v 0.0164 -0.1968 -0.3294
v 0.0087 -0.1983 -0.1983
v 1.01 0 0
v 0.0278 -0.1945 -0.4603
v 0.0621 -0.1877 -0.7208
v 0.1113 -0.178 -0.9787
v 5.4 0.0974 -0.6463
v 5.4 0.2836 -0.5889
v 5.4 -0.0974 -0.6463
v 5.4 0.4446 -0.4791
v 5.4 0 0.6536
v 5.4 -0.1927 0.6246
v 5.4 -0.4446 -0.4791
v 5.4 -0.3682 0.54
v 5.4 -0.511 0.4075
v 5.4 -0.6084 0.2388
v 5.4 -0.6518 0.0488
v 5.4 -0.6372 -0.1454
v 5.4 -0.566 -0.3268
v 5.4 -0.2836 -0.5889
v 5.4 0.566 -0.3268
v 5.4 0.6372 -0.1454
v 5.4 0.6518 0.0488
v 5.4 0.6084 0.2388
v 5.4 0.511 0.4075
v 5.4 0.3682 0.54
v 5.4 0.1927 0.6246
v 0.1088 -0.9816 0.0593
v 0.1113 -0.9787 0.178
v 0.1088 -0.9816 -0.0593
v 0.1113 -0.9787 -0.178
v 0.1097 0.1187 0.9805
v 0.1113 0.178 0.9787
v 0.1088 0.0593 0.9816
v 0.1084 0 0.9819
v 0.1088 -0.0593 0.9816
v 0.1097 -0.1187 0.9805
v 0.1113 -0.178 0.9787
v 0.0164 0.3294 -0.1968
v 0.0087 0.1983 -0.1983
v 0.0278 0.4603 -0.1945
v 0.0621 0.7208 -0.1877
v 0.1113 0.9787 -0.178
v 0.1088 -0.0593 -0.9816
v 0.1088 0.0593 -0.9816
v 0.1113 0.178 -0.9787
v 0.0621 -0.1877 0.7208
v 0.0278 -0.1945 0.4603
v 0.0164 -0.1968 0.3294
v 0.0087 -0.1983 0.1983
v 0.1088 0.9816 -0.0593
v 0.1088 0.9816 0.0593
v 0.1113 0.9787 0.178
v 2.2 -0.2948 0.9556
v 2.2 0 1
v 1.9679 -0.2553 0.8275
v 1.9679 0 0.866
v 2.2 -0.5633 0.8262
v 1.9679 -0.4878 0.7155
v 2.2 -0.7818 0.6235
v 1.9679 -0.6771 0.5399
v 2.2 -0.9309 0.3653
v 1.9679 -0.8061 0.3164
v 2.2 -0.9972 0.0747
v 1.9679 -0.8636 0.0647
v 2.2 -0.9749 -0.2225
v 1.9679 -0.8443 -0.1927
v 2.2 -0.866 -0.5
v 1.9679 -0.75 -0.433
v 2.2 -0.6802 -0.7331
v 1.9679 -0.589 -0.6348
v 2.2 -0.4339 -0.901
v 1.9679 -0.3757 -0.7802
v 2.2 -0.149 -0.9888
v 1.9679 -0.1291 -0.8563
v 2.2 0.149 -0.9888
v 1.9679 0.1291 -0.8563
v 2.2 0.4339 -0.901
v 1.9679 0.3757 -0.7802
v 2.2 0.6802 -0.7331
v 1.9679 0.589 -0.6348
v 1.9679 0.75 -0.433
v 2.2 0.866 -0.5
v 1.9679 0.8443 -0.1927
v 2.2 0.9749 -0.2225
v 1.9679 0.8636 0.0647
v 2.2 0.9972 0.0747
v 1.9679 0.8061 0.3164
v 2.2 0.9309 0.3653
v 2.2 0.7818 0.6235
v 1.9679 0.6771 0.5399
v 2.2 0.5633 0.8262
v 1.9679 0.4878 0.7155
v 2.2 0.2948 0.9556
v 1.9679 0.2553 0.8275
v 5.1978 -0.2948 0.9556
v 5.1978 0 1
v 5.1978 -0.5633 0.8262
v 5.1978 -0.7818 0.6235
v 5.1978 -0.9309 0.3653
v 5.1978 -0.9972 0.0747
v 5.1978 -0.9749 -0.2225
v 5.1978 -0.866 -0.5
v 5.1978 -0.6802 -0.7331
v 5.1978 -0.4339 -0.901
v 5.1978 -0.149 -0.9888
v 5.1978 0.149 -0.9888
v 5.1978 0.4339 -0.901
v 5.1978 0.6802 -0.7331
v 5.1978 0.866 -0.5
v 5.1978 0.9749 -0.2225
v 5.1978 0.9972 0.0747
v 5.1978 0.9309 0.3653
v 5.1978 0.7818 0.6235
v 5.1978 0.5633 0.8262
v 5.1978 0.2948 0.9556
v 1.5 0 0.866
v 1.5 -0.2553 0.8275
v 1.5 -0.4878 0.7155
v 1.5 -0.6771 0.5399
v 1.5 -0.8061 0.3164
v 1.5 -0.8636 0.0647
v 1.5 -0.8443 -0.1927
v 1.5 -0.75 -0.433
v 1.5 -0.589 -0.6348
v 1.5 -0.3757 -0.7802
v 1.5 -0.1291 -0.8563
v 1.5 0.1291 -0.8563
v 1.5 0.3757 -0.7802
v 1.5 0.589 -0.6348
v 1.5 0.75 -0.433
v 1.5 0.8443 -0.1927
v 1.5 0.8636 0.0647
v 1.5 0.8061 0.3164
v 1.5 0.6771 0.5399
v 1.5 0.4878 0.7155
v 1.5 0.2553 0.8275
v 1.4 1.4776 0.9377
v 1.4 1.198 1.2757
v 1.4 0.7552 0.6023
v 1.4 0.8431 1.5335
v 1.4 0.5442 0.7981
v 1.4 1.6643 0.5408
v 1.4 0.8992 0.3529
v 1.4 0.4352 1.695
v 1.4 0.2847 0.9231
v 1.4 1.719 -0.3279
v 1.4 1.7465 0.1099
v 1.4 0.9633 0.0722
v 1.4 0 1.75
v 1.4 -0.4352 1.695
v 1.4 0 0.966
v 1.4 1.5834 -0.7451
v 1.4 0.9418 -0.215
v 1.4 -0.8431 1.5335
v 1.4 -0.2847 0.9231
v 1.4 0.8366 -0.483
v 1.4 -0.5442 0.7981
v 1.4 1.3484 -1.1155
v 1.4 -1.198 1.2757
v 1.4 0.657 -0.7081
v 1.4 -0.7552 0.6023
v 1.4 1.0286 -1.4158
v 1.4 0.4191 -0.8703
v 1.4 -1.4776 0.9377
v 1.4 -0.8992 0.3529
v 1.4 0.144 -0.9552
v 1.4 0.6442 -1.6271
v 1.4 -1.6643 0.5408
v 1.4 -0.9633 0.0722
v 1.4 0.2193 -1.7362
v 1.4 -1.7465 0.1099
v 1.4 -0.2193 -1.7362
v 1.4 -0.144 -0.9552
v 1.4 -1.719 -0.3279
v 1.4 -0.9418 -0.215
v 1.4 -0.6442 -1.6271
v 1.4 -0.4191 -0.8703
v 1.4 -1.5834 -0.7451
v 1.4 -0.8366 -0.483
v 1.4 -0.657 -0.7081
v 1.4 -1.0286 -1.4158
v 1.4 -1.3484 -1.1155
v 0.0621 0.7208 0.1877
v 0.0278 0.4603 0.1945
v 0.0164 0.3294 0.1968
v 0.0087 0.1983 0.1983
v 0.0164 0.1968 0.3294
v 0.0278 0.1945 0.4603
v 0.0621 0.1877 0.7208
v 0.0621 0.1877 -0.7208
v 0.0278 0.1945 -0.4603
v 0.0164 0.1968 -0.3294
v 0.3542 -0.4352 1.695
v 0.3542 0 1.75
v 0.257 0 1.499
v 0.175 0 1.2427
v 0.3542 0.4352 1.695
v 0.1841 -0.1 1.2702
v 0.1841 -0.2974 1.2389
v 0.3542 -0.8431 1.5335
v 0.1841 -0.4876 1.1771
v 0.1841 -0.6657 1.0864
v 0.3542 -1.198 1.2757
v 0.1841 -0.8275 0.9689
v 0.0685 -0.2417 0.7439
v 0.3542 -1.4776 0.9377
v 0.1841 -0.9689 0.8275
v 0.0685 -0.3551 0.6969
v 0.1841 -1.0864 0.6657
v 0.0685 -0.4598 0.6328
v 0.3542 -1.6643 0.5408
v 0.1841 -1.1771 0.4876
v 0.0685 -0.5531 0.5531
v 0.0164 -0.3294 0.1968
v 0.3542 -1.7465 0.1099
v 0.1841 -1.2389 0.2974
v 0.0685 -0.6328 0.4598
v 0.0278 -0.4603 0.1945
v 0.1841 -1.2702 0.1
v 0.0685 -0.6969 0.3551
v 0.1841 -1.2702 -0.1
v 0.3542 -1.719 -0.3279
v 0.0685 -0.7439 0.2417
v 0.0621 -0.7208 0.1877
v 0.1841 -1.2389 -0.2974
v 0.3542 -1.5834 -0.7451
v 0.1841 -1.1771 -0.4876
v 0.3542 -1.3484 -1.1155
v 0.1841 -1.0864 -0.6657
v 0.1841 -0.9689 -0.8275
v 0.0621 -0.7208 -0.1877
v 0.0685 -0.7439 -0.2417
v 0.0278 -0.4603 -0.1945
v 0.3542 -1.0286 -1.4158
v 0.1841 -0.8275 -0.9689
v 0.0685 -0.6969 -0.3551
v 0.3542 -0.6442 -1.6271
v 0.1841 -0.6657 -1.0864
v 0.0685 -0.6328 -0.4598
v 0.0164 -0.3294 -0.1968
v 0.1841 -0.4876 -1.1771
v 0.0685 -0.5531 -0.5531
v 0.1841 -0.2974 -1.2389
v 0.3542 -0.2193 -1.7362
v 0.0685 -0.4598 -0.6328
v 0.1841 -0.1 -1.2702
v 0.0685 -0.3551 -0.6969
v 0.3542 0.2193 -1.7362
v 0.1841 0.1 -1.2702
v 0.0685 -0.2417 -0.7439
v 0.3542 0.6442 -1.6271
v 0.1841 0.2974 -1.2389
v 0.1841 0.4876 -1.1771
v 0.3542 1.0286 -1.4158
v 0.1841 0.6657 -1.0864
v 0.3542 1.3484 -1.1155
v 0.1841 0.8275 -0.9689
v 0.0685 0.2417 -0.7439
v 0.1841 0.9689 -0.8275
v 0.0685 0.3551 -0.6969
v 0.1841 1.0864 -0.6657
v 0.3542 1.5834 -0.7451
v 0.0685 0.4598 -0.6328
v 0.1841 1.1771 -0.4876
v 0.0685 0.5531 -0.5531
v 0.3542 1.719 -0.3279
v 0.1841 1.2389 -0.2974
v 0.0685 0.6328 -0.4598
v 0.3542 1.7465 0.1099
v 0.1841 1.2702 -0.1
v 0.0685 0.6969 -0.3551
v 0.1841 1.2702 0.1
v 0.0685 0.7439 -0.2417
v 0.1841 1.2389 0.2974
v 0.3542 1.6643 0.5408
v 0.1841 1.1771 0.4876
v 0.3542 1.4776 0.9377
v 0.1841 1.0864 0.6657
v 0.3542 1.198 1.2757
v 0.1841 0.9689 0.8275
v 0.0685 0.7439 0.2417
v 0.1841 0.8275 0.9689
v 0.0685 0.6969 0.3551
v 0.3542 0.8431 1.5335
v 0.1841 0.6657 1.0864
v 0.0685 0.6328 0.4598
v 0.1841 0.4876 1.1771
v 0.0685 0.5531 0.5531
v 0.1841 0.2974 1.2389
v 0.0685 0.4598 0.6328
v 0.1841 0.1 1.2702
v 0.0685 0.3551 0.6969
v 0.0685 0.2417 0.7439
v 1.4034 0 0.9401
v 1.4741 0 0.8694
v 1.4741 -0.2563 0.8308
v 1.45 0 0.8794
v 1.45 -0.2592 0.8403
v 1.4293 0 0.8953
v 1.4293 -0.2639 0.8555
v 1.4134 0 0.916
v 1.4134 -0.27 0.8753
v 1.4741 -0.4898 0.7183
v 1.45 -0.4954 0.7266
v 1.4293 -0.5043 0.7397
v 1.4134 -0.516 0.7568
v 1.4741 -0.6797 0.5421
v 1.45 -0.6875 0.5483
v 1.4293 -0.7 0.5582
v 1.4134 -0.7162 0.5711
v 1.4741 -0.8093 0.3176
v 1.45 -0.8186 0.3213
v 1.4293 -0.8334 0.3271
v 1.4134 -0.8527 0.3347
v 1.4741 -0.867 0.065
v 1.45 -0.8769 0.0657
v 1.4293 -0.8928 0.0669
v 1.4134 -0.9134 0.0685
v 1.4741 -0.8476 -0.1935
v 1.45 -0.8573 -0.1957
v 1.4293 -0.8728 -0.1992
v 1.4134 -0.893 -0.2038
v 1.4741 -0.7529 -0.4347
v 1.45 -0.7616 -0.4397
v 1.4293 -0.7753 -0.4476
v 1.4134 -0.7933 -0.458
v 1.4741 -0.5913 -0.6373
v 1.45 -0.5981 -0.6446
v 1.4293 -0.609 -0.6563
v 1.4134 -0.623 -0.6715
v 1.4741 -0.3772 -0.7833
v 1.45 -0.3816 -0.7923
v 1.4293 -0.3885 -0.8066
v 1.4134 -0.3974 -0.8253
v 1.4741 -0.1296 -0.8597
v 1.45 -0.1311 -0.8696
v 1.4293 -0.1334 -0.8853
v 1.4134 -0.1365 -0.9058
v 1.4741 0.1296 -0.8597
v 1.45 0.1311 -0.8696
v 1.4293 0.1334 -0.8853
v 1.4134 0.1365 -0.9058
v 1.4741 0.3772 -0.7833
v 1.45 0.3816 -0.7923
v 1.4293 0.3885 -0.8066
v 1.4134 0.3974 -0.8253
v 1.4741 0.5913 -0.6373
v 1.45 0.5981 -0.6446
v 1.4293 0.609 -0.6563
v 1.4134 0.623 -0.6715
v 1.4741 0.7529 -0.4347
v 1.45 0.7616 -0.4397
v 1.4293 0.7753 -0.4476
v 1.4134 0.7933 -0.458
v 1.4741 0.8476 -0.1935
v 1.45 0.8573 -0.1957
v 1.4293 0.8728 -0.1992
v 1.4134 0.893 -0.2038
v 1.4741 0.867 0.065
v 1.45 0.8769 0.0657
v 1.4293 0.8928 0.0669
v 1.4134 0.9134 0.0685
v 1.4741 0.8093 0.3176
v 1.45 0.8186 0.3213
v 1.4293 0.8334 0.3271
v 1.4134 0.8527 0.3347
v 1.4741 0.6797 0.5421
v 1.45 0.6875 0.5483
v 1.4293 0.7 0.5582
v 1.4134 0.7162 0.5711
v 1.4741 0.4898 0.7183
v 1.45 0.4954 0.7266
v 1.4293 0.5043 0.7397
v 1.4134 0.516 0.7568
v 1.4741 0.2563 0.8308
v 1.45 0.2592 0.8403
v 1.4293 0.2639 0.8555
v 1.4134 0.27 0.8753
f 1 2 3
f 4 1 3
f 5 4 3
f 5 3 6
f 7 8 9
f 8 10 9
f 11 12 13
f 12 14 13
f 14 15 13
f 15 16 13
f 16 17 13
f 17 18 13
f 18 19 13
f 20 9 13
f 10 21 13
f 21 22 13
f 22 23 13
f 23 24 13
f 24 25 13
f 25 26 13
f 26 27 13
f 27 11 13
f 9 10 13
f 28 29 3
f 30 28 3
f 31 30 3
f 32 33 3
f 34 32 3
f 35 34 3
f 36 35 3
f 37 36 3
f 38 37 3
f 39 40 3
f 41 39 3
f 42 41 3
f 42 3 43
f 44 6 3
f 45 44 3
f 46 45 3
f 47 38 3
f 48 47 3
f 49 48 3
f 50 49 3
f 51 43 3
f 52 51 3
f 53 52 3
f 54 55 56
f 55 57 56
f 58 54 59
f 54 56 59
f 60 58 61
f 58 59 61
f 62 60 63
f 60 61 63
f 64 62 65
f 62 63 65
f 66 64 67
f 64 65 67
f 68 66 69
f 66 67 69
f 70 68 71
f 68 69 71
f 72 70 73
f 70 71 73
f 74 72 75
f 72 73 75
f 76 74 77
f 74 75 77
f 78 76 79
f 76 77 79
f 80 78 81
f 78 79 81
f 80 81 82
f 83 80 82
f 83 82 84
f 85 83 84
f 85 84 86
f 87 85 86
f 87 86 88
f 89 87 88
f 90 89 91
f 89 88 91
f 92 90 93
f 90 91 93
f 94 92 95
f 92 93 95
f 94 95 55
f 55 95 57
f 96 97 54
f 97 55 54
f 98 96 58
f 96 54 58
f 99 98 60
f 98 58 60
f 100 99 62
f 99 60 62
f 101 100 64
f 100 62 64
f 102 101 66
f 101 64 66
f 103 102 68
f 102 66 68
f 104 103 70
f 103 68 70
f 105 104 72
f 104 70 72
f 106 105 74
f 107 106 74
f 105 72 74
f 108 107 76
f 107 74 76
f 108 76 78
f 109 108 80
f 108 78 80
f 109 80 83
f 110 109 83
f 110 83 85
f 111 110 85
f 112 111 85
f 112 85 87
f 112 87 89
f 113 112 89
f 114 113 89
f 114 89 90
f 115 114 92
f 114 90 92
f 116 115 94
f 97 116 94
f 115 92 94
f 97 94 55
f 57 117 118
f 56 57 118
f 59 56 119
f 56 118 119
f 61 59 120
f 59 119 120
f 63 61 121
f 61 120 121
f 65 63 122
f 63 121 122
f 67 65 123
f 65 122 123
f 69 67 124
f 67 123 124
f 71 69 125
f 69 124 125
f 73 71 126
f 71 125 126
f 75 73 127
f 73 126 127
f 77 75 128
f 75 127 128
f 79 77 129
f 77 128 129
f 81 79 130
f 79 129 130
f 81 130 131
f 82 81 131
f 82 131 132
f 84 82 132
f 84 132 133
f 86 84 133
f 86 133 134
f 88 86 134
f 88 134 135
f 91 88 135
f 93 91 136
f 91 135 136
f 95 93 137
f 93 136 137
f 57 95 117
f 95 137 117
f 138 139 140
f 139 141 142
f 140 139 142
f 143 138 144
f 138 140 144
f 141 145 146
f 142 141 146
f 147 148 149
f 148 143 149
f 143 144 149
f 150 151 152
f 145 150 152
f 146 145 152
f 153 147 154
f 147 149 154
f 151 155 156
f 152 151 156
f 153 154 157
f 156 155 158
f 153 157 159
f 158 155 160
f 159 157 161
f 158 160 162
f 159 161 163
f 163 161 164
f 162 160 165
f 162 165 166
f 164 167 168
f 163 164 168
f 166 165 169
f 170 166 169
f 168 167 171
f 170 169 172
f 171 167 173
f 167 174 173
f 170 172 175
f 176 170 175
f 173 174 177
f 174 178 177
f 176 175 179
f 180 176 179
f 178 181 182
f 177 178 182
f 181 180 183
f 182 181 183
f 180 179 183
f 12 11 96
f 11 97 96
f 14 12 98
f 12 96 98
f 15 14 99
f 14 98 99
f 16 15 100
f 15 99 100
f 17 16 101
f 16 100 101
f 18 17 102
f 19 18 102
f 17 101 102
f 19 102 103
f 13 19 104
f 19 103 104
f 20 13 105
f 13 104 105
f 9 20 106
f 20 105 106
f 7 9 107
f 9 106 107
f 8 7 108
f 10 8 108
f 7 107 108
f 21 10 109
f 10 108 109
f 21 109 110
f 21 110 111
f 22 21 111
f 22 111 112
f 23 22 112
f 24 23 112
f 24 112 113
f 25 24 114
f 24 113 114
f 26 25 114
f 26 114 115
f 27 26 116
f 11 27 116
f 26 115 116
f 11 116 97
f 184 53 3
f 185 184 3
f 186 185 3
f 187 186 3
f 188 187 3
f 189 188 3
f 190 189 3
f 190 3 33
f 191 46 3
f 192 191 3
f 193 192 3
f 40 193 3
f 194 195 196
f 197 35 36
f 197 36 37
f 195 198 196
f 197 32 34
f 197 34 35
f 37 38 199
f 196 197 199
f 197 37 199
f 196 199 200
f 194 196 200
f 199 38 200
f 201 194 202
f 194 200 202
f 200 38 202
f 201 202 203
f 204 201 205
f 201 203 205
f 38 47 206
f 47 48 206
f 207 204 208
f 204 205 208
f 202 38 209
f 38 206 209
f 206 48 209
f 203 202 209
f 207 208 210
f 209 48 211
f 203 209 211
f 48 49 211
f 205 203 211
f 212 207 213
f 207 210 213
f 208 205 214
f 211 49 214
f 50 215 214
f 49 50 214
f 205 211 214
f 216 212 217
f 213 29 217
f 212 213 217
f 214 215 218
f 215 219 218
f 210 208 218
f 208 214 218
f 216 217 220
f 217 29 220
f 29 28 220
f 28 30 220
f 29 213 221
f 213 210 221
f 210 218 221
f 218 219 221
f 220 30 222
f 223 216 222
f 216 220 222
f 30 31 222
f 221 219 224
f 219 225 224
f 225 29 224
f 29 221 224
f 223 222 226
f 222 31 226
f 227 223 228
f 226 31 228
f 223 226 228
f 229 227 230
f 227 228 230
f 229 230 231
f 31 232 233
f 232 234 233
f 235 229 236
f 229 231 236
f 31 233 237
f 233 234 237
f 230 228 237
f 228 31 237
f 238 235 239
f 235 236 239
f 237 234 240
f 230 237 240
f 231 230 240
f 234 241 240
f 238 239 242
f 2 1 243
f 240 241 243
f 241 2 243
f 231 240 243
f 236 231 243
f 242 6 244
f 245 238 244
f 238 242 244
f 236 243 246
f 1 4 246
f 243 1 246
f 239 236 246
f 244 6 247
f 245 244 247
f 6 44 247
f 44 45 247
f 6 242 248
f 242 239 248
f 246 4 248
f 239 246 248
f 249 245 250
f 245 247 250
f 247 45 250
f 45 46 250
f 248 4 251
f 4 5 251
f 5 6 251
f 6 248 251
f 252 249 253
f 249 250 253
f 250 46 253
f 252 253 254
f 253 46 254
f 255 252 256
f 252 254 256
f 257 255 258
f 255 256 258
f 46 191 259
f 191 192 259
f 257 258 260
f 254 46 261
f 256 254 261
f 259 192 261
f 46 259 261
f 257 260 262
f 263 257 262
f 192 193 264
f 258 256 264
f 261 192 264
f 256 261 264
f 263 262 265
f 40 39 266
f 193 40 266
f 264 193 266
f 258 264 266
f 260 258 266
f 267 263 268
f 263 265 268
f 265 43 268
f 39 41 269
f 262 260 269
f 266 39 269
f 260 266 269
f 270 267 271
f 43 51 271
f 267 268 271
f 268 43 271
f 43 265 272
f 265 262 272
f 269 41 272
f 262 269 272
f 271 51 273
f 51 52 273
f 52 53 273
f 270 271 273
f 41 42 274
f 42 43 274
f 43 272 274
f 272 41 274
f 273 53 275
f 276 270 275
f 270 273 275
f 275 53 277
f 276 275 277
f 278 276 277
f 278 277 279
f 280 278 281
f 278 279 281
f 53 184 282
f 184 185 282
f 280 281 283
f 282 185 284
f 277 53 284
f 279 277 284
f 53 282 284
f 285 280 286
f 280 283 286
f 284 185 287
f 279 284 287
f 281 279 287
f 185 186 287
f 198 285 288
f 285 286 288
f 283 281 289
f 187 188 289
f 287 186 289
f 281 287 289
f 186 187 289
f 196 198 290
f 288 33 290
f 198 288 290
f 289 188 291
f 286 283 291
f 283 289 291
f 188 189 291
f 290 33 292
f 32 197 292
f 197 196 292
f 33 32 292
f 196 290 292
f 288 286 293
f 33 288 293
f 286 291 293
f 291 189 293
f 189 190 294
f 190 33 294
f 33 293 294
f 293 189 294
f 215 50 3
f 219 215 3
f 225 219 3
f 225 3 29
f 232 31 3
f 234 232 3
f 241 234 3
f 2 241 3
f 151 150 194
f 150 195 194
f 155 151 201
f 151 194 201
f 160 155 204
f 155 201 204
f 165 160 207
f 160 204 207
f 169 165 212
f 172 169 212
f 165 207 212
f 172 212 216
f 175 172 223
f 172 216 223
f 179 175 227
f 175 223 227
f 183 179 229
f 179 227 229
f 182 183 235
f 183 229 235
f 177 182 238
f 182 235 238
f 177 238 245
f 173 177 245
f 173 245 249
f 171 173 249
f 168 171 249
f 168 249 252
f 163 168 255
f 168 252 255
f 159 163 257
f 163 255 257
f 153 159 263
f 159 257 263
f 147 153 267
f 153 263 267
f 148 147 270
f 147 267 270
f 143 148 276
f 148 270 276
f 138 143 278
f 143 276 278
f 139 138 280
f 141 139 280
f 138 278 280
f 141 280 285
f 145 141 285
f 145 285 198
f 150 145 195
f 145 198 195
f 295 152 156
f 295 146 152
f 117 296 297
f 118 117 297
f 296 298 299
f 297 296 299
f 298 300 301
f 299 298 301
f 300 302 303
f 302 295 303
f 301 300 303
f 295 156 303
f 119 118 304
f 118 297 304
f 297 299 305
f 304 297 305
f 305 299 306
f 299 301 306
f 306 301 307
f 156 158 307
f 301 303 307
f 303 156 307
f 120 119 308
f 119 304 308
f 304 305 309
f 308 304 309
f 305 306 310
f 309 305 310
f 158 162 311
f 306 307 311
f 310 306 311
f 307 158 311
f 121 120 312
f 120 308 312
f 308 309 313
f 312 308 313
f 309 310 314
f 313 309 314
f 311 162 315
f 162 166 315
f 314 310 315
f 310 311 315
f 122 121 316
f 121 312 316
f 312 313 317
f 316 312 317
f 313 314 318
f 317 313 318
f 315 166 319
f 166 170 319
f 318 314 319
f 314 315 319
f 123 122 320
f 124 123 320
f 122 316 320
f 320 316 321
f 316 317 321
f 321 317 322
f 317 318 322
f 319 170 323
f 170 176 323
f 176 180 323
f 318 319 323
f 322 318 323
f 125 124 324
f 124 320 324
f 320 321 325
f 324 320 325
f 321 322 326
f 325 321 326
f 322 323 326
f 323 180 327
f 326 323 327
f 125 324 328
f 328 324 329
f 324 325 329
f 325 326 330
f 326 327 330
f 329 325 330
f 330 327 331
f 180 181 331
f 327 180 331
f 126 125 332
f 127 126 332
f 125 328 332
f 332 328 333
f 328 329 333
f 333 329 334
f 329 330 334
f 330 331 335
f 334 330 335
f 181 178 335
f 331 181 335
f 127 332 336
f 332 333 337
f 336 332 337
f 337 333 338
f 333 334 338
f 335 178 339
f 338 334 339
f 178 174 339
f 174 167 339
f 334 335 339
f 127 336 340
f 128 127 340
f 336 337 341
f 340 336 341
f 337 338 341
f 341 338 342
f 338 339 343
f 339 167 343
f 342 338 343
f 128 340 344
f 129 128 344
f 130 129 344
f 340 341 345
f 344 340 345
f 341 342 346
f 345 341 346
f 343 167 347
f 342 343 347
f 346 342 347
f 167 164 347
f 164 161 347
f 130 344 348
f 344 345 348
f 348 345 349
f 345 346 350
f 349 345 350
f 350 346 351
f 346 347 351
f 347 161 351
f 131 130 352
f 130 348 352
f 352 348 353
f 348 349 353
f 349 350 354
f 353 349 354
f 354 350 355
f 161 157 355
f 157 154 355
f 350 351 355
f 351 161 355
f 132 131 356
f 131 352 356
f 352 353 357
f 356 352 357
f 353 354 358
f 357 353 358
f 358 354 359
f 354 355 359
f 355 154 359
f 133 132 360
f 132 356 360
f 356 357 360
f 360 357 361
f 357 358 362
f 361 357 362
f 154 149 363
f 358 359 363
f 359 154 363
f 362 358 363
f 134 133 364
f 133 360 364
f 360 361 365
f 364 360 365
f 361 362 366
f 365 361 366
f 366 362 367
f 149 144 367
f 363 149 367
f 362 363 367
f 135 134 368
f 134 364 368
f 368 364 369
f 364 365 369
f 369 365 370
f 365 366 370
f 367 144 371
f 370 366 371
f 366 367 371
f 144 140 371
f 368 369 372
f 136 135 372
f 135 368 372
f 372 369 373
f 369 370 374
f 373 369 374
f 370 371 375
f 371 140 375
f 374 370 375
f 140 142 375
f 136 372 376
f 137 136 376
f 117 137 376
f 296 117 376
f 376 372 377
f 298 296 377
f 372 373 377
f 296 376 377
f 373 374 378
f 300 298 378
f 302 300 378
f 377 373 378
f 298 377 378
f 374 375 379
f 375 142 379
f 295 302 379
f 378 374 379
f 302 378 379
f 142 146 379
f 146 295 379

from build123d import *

# Parameters (mm, degrees)
FILLET_1_R               = 0.1
PATTERN_CIRCULAR_1_COUNT = 2
PATTERN_CIRCULAR_1_ANGLE = 90


with BuildPart() as part:
    # 草图1 → Revolve 816 (revolve)
    with BuildSketch(Plane.XY, mode=Mode.PRIVATE) as revolve_816_sk:
        with BuildLine():
            Line((0, 0), (5.4, 0))
            Line((5.4, 0), (5.4, 1))
            Line((5.4, 1), (2.2, 1))
            Line((2.2, 1), (1.967905192, 0.866))
            Line((1.967905192, 0.866), (1.4, 0.866))
            Line((1.4, 0.866), (1.4, 1.75))
            Line((1.4, 1.75), (0.354219012, 1.75))
            ThreePointArc((0.354219012, 1.75), (0.089443661, 0.89274452), (0, 0))
        make_face()
    revolve(revolve_816_sk.sketch.rotate(Axis((-0.437242634, 0, 0), (1, 0, 0)), 90), axis=Axis((-0.437242634, 0, 0), (1, 0, 0)))

    # 圆角1
    fillet_1_edges = [part.edges().sort_by_distance(p)[0] for p in [
        (1.4, 0, -0.866),
    ]]
    fillet(fillet_1_edges, radius=FILLET_1_R)

    # 草图2 → 切除-放样1 section 0
    with BuildSketch(Plane(origin=(0, 0, 0), x_dir=(0, 0, -1), z_dir=(1, 0, 0)), mode=Mode.PRIVATE) as loft_1_s0:
        with BuildLine():
            Line((0.2, 1.1), (-0.2, 1.1))
            Line((-0.2, 1.1), (-0.2, -1.1))
            Line((-0.2, -1.1), (0.2, -1.1))
            Line((0.2, -1.1), (0.2, 1.1))
        make_face()
    loft_1 = loft([loft_1_s0.sketch, Vertex(1.01, 0, 0)], mode=Mode.SUBTRACT)

    # 阵列(圆周)1: 切除-放样1 ×2 about axis
    pattern_circular_1_axis = Axis((0, 0, 0), (1, 0, 0))
    for i in range(1, PATTERN_CIRCULAR_1_COUNT):
        add(loft_1.rotate(pattern_circular_1_axis, i * PATTERN_CIRCULAR_1_ANGLE / (PATTERN_CIRCULAR_1_COUNT - 1)), mode=Mode.SUBTRACT)

    # 草图4 → 切除-旋转1 (revolve, cut)
    with BuildSketch(Plane.XY, mode=Mode.PRIVATE) as cut_revolve_1_sk:
        Polygon((5.197833598, 1), (5.597833598, 1), (5.4, 0.6536), align=None)
    revolve(cut_revolve_1_sk.sketch.rotate(Axis((4.77468063, 0, 0), (1, 0, 0)), 90), axis=Axis((4.77468063, 0, 0), (1, 0, 0)), mode=Mode.SUBTRACT)


solid = part.part
